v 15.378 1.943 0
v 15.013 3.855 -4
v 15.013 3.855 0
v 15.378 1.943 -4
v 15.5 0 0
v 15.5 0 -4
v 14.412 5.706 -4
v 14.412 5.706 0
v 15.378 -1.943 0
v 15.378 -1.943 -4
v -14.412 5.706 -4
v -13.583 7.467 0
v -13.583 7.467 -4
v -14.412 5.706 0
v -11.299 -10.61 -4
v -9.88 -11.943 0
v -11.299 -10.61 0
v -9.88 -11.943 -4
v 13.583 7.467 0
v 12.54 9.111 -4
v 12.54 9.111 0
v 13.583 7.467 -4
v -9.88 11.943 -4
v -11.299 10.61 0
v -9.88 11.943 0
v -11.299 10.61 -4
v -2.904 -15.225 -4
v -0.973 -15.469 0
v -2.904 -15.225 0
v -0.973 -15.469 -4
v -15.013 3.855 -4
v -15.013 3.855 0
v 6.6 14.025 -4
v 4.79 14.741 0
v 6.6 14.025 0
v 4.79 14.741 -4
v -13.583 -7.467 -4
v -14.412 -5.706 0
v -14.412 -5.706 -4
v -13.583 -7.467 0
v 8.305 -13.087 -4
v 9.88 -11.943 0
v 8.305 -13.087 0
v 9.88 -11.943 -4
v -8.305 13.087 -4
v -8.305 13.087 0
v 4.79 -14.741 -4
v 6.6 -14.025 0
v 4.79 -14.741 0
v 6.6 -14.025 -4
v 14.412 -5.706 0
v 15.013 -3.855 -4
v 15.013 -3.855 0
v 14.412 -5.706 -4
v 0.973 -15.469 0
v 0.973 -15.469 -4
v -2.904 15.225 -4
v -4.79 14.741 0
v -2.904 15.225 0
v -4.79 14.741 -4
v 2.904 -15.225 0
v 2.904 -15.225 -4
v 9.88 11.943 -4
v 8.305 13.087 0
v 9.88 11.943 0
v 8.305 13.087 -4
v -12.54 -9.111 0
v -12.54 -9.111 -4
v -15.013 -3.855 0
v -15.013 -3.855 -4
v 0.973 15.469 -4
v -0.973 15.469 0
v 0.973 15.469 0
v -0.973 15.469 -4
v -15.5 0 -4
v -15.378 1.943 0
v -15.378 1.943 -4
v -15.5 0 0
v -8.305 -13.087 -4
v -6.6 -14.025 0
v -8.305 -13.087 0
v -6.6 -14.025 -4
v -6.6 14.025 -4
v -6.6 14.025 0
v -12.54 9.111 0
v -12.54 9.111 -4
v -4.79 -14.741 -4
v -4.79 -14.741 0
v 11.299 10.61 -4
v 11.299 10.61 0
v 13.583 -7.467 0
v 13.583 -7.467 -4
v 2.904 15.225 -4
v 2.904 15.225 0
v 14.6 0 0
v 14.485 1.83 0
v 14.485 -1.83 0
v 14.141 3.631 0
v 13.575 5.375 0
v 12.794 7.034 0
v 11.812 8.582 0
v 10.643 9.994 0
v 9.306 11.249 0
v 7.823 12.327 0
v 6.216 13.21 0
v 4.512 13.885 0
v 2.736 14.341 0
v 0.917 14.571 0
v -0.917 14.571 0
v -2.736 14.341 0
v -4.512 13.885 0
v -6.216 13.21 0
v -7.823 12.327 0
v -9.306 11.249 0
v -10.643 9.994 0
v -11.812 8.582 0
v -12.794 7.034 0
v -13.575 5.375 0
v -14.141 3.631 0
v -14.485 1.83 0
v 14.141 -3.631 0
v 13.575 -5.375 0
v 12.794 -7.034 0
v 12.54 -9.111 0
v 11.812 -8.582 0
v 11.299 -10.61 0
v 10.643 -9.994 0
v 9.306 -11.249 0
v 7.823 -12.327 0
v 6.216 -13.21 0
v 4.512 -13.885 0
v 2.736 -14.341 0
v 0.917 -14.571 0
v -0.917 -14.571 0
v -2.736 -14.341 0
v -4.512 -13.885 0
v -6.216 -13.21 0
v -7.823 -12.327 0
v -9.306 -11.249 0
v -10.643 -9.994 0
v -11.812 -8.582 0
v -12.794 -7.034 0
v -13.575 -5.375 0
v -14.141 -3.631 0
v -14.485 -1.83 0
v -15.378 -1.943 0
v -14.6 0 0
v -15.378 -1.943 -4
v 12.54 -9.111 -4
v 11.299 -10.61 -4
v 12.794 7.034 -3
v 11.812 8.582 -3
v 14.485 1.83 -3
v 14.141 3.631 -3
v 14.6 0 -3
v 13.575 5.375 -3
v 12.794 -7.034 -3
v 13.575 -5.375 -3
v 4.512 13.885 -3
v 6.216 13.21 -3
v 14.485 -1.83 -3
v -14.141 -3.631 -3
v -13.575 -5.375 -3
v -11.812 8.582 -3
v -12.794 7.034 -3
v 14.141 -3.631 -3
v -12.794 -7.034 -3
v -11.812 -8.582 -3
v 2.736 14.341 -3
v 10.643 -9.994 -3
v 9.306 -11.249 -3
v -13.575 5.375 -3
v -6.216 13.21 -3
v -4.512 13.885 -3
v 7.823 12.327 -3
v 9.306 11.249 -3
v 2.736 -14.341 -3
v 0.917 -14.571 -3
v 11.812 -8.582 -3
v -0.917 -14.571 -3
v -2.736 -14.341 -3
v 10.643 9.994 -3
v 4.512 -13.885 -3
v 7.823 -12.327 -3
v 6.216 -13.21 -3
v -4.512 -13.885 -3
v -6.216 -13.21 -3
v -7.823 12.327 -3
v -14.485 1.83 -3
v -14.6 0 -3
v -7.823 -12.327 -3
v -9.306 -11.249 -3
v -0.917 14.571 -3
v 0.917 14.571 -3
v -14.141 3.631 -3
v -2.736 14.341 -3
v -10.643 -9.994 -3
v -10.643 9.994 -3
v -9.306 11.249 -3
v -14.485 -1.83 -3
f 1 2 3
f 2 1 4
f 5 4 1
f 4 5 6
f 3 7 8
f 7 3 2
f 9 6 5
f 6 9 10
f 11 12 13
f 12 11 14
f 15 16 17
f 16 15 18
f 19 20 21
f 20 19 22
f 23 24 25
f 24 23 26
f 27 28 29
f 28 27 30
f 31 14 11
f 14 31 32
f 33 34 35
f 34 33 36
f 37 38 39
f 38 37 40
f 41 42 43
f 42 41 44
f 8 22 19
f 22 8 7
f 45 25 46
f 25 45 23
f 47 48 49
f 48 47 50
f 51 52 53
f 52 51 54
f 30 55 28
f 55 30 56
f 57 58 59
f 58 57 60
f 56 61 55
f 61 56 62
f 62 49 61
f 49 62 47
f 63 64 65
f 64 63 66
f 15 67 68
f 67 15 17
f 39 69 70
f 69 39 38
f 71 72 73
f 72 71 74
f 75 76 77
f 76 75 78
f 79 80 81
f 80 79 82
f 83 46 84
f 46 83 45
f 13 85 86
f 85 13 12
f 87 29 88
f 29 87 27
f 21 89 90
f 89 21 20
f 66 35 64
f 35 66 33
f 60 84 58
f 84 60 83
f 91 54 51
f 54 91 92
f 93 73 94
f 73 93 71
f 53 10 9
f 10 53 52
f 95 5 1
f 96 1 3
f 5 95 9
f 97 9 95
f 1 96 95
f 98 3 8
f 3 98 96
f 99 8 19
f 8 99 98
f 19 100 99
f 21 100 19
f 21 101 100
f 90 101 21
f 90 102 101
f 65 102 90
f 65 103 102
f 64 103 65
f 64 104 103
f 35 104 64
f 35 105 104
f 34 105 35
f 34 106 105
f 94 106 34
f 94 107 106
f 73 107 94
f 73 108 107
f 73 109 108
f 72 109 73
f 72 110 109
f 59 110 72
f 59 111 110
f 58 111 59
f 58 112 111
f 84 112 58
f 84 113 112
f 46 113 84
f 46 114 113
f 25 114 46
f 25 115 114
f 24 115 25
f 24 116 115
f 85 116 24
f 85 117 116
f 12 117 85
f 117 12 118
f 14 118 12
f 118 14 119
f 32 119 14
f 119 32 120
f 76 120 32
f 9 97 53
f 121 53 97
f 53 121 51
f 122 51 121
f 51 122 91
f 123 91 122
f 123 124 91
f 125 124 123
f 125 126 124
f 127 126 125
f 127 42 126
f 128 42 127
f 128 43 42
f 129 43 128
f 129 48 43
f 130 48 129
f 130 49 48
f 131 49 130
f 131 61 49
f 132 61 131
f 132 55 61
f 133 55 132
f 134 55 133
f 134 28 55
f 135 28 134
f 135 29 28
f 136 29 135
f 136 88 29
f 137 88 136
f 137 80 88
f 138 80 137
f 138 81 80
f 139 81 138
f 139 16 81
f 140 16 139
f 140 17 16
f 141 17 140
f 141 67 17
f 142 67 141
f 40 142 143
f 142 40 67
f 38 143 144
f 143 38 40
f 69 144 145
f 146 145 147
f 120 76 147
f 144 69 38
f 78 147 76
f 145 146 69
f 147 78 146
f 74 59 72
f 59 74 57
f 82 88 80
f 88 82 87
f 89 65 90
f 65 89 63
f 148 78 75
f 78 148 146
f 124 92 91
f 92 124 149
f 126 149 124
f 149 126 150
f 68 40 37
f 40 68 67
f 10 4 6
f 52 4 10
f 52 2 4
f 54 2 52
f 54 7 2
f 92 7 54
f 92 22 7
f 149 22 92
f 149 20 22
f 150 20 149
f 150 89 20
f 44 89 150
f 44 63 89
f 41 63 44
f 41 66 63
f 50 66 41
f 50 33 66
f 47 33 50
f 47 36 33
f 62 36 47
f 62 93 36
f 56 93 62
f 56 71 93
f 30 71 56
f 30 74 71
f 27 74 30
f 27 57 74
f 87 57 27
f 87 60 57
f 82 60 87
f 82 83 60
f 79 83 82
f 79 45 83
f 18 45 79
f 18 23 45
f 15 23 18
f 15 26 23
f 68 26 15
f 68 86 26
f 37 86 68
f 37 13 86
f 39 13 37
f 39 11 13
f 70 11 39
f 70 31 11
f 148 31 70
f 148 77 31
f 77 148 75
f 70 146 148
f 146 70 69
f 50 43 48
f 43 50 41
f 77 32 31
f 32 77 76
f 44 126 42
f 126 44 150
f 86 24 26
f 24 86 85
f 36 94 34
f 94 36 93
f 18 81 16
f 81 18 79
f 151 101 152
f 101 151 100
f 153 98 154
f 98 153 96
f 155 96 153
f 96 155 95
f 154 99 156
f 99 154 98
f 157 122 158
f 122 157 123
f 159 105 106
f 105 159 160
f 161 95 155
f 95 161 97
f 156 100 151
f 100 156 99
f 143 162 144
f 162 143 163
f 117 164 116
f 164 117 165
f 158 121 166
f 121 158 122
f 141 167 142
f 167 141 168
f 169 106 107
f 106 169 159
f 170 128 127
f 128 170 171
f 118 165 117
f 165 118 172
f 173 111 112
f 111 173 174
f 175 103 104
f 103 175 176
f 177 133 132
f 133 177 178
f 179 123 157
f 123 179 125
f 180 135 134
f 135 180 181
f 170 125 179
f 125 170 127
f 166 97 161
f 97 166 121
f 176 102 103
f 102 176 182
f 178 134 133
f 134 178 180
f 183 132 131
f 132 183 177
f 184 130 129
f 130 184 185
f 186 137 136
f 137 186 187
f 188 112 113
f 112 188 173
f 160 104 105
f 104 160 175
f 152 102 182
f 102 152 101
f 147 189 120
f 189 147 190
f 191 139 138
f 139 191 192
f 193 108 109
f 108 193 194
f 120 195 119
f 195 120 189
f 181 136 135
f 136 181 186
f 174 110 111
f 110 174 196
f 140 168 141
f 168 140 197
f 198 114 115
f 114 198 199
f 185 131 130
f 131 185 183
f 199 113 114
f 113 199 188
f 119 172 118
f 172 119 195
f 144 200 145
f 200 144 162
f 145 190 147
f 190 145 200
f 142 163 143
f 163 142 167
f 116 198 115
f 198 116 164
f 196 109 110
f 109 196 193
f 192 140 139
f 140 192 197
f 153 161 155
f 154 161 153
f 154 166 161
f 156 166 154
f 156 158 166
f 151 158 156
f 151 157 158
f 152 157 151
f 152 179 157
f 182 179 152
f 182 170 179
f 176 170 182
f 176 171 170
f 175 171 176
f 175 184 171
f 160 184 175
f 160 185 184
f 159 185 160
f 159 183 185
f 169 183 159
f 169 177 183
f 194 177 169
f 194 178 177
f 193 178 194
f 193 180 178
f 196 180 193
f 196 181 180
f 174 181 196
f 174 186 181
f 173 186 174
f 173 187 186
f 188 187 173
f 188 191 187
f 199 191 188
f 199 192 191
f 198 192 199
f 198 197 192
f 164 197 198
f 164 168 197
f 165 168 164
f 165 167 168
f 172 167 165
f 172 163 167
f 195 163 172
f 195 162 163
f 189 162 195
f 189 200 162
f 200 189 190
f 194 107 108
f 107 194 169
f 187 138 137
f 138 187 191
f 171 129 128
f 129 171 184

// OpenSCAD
$fn = 50;


difference() {
	union() {
		translate(v = [0, 0, -4.0000000000]) {
			cylinder(h = 4, r = 15.5000000000);
		}
	}
	union() {
		#translate(v = [0, 0, -3.0000000000]) {
			cylinder(h = 3, r = 14.6000000000);
		}
	}
}
